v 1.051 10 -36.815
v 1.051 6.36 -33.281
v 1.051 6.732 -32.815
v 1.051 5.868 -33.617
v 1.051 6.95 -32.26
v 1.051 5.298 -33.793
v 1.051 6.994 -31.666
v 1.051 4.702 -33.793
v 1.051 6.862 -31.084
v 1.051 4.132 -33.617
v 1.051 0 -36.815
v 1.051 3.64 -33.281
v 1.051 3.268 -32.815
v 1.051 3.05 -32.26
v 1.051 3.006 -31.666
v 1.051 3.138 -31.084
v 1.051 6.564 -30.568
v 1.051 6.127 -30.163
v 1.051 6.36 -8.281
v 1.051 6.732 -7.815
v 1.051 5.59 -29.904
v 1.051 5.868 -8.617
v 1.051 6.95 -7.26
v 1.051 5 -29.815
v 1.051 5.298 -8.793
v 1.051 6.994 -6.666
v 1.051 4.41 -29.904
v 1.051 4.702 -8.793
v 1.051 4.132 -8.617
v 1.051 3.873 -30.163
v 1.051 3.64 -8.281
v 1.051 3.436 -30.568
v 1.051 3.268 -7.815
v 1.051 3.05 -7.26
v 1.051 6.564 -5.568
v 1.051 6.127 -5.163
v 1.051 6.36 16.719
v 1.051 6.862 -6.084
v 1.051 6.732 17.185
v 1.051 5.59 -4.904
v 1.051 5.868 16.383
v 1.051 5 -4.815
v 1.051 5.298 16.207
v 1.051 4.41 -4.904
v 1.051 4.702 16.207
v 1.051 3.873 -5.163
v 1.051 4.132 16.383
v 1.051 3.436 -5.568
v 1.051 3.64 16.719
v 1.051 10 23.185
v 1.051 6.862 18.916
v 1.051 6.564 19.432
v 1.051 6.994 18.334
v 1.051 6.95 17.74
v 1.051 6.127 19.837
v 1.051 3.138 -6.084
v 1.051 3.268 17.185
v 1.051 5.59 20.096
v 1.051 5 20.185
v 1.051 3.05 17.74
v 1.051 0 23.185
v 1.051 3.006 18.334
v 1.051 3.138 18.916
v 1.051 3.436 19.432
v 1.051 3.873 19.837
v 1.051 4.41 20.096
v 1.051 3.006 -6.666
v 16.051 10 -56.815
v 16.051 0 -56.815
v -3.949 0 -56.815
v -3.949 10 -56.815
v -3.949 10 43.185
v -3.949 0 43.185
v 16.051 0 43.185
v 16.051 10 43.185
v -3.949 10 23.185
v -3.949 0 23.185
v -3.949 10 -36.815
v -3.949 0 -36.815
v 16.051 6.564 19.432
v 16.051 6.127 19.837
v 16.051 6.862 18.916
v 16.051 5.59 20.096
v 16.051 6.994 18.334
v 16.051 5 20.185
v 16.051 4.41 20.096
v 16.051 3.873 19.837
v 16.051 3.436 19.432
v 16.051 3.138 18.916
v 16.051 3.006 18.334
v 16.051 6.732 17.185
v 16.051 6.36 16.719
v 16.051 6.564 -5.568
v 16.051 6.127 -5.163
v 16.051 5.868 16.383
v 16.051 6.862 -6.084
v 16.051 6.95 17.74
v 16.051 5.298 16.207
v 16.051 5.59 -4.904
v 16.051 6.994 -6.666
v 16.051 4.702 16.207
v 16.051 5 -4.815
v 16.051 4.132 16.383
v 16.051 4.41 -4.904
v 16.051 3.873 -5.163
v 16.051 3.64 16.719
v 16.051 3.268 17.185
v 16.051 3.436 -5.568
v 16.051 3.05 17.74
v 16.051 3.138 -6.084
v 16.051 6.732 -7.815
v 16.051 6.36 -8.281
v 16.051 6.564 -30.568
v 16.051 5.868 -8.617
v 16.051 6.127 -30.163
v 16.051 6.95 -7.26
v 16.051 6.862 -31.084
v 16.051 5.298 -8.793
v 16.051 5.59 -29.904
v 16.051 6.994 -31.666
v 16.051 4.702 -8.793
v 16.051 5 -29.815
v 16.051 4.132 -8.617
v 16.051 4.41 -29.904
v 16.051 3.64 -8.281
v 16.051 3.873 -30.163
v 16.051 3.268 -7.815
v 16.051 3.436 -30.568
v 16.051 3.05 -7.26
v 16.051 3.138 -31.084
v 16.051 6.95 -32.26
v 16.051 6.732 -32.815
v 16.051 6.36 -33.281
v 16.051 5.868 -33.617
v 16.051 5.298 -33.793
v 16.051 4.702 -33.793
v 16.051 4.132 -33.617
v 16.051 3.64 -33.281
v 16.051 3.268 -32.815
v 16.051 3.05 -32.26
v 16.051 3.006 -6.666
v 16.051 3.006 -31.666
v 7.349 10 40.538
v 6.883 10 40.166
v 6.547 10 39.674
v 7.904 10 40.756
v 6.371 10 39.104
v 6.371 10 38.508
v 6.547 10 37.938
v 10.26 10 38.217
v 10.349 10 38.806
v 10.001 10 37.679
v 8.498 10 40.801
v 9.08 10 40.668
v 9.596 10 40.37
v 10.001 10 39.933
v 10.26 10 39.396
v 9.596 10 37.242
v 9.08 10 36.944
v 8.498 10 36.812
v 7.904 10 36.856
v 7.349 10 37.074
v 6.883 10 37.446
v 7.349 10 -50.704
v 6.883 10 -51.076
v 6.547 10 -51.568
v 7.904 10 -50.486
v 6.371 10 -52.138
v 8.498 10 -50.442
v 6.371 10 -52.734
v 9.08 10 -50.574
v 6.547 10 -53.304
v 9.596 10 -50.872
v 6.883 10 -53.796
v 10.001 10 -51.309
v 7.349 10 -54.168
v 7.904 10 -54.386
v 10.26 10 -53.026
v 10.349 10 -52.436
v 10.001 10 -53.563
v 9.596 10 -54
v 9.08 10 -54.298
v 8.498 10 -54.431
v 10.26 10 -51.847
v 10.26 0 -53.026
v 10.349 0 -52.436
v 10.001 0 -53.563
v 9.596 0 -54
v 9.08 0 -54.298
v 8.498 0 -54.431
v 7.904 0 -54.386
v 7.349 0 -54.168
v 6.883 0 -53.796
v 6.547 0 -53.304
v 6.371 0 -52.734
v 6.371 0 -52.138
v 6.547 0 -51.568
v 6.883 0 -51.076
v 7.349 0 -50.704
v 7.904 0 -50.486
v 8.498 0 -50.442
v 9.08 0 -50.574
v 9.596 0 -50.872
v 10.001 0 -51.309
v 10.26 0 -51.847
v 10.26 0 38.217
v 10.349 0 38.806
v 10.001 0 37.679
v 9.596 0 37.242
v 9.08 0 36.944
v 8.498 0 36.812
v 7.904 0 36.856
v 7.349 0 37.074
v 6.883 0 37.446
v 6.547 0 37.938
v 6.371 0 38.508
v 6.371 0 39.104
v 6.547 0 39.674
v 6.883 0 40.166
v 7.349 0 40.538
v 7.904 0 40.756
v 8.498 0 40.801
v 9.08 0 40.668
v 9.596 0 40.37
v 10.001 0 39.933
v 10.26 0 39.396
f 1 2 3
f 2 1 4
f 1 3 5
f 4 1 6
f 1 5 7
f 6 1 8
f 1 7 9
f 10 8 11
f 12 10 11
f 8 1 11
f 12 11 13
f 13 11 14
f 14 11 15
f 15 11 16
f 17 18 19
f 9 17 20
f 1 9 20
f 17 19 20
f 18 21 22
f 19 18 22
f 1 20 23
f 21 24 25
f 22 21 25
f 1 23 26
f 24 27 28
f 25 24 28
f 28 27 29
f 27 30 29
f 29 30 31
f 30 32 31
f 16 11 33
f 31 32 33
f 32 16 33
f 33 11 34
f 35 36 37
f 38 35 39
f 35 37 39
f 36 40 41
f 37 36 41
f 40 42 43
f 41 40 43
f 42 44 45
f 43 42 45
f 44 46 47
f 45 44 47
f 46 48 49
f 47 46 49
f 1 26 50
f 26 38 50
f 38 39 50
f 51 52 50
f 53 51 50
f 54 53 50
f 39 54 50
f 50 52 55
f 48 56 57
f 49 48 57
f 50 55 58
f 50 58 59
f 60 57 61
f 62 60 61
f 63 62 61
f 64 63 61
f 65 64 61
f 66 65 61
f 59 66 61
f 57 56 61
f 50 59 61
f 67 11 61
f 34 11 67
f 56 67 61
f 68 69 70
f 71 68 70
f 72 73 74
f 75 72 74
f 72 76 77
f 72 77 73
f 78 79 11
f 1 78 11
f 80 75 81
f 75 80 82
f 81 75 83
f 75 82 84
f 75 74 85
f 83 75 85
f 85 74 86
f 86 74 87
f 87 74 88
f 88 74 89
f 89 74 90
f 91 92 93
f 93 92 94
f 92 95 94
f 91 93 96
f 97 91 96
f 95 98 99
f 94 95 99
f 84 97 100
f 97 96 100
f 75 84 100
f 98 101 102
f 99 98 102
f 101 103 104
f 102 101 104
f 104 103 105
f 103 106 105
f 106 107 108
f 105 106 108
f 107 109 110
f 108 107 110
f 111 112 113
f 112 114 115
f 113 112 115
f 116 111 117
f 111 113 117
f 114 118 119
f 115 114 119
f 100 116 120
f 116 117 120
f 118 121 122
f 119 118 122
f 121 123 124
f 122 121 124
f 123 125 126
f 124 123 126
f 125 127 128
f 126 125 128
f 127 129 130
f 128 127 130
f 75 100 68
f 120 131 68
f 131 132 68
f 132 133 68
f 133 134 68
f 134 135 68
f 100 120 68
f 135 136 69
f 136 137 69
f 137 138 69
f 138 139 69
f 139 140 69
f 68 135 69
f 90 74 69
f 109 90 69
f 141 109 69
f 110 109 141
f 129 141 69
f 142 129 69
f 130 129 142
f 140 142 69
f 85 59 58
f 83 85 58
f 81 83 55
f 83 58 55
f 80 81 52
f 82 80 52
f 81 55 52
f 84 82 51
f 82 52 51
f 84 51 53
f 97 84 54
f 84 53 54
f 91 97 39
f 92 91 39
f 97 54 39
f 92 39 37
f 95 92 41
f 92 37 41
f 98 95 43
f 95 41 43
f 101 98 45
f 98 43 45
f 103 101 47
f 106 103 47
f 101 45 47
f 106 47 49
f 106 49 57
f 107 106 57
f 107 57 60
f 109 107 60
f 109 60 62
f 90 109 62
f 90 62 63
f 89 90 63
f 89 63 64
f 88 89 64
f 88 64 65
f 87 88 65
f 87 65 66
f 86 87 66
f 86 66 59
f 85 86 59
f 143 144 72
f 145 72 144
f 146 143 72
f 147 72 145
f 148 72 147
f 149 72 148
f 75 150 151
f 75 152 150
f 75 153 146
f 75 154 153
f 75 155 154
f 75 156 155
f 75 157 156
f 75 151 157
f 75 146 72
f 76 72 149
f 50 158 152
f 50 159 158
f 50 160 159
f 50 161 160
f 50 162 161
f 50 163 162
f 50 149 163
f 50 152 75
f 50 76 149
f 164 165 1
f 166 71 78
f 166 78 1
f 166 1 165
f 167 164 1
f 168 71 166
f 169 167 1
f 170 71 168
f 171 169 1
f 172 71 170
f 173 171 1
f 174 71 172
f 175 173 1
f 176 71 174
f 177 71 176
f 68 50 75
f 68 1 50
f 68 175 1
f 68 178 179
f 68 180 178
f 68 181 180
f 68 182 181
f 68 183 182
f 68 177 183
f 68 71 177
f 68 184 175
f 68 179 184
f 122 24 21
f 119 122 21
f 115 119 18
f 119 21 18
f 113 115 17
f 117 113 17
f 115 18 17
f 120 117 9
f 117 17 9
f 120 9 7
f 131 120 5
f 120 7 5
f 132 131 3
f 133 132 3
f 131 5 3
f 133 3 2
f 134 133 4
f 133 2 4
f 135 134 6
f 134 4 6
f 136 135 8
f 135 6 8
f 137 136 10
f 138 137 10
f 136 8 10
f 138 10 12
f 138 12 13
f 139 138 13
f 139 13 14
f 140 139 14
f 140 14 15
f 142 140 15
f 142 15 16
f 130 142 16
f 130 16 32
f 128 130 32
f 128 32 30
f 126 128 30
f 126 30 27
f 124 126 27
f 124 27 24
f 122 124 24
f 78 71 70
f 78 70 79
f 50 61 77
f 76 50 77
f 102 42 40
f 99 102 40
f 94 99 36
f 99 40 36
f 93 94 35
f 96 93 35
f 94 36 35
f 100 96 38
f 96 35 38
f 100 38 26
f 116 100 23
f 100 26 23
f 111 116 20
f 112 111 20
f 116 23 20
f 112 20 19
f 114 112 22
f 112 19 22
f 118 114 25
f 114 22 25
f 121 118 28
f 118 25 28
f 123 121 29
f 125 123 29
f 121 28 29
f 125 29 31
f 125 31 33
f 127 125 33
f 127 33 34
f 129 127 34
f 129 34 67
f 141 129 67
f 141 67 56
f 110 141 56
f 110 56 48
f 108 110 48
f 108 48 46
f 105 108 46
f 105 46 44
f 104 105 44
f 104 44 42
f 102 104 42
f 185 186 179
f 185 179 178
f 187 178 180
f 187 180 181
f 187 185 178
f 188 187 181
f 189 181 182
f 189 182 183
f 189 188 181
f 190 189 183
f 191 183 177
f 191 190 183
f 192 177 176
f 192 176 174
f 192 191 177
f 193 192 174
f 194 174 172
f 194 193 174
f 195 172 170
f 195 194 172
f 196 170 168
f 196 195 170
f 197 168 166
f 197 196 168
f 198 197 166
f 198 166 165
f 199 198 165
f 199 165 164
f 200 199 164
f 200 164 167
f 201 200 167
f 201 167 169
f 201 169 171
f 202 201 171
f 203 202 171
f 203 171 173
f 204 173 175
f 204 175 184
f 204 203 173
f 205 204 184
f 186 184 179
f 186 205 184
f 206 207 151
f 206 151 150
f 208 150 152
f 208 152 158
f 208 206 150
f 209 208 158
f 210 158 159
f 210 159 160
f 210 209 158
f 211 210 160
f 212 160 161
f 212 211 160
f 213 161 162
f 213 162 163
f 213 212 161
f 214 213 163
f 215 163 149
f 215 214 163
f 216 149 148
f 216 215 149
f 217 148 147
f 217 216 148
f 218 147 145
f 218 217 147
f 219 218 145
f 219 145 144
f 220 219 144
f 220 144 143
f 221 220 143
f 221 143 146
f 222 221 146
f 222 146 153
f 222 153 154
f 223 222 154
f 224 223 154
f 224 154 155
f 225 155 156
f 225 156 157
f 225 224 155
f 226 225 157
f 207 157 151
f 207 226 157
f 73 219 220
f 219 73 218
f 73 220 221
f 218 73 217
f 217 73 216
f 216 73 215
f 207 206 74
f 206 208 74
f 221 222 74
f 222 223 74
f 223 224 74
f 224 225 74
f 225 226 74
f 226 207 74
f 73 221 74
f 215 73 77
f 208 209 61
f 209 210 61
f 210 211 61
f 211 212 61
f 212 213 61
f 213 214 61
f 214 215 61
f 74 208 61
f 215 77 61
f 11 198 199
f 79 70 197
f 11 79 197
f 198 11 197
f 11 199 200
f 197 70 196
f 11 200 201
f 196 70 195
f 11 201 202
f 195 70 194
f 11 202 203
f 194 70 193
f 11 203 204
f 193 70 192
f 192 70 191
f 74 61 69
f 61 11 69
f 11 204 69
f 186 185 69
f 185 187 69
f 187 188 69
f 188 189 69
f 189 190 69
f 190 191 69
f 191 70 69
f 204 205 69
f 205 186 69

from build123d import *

# Parameters (mm, degrees)
SKETCH1_R           = 2
BOSS_EXTRUDE1_DEPTH = 10
SKETCH2_R           = 2
CUT_EXTRUDE1_DEPTH  = 30
SKETCH3_W           = 147.072515525
SKETCH3_H           = 61.375716436
CUT_EXTRUDE2_DEPTH  = 5


with BuildPart() as part:
    # Sketch1 → Boss-Extrude1 (new body)
    with BuildSketch(Plane(origin=(0, 0, 0), x_dir=(1, 0, 0), z_dir=(0, 1, 0))):
        Polygon((16.050729855, 56.814996593), (-8.949270145, 56.814996593), (-8.949270145, 36.814996593), (1.050729855, 36.814996593), (1.050729855, -23.185003407), (-8.949270145, -23.185003407), (-8.949270145, -43.185003407), (16.050729855, -43.185003407), align=None)
        with Locations((8.348885954, 52.436102934)):
            Circle(SKETCH1_R, mode=Mode.SUBTRACT)
        with Locations((8.348885954, -38.806109747)):
            Circle(SKETCH1_R, mode=Mode.SUBTRACT)
    extrude(amount=BOSS_EXTRUDE1_DEPTH)

    # Sketch2 → Cut-Extrude1 (cut)
    with BuildSketch(Plane.ZY.offset(-1.050729855)):
        with Locations((-31.814996593, 5)):
            Circle(SKETCH2_R)
        with Locations((18.185003407, 5)):
            Circle(SKETCH2_R)
        with Locations((-6.814996593, 5)):
            Circle(SKETCH2_R)
    extrude(amount=-CUT_EXTRUDE1_DEPTH, mode=Mode.SUBTRACT)

    # Sketch3 → Cut-Extrude2 (cut)
    with BuildSketch(Plane.ZY.offset(8.949270145)):
        with Locations((-8.47035824, 7.801381248)):
            Rectangle(SKETCH3_W, SKETCH3_H)
    extrude(amount=-CUT_EXTRUDE2_DEPTH, mode=Mode.SUBTRACT)


solid = part.part
